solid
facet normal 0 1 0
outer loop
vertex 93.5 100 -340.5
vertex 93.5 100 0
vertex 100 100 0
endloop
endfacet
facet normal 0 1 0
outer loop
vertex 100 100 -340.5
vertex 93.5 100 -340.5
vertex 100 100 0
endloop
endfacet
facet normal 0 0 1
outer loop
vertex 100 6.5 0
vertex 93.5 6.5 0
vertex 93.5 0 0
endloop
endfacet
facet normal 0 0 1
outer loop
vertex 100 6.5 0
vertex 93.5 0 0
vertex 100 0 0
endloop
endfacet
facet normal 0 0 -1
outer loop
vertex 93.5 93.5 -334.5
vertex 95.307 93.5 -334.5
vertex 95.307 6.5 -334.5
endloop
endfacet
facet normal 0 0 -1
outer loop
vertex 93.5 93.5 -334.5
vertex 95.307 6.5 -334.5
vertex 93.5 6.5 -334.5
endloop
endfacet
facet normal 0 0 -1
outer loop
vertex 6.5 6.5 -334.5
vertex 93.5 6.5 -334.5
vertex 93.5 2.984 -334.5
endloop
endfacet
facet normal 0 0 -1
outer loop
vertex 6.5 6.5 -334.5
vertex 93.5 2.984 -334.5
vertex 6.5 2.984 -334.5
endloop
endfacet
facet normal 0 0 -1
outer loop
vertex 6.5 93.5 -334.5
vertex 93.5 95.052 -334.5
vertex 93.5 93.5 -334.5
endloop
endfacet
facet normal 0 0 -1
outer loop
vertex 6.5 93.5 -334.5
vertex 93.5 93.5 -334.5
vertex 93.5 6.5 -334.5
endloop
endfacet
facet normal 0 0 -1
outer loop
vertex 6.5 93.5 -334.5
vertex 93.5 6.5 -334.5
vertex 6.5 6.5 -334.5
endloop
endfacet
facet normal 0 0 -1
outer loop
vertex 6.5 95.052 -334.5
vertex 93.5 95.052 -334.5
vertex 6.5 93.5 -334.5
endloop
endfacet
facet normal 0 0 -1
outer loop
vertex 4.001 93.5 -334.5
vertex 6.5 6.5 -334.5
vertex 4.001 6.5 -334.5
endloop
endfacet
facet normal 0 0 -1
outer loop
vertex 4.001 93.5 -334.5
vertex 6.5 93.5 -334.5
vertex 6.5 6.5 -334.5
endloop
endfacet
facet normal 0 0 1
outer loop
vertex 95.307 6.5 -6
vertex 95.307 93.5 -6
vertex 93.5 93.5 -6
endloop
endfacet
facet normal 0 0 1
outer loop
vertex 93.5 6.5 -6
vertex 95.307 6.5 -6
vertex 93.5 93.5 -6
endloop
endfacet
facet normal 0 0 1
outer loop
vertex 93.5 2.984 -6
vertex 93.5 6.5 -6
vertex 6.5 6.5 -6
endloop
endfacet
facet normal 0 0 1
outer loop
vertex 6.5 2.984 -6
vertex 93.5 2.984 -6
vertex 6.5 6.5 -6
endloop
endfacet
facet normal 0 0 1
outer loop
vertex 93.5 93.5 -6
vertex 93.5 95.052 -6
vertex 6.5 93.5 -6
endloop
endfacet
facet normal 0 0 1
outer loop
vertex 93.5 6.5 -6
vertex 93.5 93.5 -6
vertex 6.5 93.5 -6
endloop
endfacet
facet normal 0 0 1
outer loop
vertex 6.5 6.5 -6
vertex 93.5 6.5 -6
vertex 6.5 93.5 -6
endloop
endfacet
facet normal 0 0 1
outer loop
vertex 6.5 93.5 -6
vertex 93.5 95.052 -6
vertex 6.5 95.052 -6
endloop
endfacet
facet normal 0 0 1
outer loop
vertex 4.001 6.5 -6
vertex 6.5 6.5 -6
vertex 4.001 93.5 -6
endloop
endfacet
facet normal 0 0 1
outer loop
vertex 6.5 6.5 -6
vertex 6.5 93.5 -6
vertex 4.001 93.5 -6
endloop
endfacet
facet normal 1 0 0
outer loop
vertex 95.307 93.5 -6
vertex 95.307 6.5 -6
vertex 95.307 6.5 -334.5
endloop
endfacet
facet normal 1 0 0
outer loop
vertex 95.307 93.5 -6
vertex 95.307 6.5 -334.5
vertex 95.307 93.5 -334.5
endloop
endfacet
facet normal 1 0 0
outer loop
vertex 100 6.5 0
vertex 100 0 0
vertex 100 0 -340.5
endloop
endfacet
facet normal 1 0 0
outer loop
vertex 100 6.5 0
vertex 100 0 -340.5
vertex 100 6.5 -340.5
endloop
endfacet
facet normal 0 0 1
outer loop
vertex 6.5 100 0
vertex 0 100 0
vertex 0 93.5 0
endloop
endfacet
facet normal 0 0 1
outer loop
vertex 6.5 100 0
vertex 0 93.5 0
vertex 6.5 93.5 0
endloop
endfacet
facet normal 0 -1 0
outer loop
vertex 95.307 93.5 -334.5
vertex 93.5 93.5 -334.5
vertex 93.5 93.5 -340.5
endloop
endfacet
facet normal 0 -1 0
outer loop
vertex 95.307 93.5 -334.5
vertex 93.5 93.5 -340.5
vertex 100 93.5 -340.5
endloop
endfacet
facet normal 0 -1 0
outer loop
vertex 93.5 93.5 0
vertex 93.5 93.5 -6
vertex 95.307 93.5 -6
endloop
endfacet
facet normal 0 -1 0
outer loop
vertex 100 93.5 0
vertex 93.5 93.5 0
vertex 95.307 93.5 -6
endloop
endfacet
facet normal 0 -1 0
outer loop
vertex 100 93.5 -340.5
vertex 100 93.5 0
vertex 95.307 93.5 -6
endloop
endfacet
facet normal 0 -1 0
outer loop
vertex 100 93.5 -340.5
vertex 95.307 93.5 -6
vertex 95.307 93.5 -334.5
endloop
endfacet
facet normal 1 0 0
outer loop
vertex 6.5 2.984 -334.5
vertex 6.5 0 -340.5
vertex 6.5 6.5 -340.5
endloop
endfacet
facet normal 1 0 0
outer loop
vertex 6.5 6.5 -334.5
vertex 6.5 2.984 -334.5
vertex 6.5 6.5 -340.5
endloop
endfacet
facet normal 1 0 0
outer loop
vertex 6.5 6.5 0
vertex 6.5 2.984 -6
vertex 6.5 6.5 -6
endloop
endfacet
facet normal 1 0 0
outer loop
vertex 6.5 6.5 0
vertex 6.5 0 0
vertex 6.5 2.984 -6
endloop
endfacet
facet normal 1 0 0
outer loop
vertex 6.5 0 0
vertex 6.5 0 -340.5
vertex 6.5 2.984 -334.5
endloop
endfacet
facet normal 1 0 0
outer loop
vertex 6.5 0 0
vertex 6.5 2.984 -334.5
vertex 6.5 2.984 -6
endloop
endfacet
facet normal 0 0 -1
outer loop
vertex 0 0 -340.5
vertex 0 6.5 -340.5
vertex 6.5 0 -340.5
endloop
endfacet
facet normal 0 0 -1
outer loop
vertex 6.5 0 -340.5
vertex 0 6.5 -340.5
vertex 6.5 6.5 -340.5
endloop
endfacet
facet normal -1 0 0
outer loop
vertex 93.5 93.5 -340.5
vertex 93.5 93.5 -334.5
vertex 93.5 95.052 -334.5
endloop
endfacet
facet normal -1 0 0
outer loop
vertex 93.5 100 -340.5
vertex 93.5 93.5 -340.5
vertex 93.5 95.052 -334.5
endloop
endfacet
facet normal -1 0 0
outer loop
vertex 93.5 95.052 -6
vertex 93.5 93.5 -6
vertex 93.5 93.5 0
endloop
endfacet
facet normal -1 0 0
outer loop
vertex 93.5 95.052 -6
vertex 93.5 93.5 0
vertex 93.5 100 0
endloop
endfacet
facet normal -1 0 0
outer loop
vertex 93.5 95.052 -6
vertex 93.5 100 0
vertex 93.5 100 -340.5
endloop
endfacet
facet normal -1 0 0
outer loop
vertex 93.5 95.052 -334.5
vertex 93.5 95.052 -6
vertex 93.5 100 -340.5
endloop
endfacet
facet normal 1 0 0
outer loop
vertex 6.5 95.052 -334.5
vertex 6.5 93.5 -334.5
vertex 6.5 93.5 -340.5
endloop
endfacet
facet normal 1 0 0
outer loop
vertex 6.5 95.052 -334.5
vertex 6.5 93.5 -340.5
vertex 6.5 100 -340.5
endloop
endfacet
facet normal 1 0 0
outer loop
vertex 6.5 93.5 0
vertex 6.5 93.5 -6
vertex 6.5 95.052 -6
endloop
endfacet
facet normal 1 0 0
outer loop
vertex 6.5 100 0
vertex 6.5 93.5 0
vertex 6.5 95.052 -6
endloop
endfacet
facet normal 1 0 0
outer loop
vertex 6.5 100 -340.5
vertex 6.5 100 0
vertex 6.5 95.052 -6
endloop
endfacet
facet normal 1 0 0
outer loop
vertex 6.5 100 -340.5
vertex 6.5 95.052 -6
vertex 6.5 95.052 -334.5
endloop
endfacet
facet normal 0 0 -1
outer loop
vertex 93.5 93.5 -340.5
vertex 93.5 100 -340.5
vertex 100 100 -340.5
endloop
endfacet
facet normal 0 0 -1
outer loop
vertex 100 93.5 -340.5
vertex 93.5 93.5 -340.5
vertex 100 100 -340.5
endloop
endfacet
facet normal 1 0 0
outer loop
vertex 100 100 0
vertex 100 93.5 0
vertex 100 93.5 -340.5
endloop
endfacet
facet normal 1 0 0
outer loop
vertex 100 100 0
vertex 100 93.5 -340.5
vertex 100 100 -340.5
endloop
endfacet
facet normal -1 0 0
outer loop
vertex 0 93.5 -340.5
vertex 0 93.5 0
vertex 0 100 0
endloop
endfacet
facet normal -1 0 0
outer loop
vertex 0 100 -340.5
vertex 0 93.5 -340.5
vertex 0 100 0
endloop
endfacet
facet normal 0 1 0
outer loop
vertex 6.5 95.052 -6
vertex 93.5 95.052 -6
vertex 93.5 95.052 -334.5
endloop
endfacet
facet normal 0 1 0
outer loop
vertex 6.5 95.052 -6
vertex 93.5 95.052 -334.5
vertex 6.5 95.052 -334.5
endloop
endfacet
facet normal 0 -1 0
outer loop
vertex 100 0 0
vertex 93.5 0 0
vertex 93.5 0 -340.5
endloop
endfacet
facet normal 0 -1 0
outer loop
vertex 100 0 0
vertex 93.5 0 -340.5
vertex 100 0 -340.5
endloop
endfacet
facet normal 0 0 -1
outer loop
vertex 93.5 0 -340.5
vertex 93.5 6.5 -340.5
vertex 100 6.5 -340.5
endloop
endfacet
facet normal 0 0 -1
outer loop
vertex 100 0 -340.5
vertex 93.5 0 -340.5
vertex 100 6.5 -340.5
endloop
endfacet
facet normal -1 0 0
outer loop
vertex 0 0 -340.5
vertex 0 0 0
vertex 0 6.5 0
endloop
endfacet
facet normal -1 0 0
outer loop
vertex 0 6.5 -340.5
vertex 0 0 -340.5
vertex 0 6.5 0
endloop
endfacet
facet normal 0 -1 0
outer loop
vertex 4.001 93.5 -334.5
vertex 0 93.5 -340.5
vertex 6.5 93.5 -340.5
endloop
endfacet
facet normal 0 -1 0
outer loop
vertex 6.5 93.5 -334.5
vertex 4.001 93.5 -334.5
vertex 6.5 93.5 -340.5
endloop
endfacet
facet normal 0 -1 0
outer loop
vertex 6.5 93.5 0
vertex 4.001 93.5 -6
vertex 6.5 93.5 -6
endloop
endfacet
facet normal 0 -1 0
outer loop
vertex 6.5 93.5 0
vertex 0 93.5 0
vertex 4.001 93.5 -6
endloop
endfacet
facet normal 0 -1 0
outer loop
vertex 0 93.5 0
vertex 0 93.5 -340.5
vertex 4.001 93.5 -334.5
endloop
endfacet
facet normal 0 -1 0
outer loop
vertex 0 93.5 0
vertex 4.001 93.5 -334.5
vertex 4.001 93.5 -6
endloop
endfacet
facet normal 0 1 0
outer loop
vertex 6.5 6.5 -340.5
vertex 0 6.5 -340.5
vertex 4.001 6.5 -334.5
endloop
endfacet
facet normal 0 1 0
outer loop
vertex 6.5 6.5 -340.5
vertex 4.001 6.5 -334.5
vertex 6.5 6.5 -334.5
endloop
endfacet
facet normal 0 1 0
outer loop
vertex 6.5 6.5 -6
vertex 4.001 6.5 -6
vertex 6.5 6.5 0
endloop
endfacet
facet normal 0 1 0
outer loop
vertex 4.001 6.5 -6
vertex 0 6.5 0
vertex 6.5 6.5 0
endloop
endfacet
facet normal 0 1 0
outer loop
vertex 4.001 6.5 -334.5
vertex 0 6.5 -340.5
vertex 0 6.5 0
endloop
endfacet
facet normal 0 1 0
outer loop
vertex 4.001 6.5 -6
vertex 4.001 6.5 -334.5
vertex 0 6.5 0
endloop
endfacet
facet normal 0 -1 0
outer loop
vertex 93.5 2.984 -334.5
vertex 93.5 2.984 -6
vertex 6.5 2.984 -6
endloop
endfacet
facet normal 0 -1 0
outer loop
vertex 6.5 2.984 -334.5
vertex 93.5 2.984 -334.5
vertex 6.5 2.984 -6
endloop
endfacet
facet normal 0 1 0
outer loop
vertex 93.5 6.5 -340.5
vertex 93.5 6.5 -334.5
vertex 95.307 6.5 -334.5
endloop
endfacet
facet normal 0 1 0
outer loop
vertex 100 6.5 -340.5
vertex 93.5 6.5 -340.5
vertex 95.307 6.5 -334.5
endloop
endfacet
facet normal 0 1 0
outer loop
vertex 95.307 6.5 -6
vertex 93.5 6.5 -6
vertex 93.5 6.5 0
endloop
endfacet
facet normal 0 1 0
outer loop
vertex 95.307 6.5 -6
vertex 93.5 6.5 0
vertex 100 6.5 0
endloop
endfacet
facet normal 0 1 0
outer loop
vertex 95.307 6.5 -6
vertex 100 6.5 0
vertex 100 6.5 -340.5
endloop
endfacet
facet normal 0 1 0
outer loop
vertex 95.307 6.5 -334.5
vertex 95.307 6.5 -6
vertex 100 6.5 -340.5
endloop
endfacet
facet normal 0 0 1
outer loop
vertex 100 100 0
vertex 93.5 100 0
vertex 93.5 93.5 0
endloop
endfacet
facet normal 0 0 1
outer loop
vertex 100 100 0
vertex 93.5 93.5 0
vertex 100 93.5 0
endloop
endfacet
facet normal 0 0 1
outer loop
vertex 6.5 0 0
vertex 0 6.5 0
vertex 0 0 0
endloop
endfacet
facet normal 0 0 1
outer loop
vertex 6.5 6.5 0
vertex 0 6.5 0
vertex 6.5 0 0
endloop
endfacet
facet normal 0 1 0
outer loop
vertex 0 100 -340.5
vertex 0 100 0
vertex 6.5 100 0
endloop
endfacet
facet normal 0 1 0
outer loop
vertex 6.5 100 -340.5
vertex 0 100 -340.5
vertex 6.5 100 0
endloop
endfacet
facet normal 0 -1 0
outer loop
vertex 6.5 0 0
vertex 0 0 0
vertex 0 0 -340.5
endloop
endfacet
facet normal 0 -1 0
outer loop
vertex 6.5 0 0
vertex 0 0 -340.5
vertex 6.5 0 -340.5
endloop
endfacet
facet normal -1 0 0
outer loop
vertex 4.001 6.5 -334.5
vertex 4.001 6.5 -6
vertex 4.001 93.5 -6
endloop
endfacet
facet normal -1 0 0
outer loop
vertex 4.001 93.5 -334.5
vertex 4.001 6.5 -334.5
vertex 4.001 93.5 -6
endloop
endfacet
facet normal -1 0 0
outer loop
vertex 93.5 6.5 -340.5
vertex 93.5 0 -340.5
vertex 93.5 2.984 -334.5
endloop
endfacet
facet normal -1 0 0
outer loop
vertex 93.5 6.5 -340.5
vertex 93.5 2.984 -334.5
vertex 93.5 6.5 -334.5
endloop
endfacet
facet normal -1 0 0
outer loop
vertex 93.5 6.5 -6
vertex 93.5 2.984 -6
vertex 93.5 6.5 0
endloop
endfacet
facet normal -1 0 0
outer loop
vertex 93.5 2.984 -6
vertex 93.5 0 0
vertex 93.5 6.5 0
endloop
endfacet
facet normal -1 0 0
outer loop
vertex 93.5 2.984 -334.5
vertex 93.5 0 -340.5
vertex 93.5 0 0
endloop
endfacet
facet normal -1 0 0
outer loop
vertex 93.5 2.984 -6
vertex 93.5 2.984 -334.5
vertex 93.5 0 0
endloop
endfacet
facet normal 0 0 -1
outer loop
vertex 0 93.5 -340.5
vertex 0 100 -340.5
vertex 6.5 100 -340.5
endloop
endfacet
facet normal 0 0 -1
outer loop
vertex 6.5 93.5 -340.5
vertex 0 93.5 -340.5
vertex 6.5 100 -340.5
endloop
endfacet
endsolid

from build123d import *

# Parameters (mm, degrees)
SKETCH1_W             = 6.5
SKETCH1_H             = 6.5
BOSS_EXTRUDE1_DEPTH   = 340.5
BOSS_EXTRUDE1_2_DEPTH = 340.5
BOSS_EXTRUDE1_3_DEPTH = 340.5
BOSS_EXTRUDE1_4_DEPTH = 340.5
SKETCH2_W             = 91.305836421
SKETCH2_H             = 92.06883784
BOSS_EXTRUDE2_DEPTH   = 328.5


with BuildPart() as part:
    # Sketch1 → Boss-Extrude1 (new body)
    with BuildSketch(Plane.XY):
        with Locations((3.25, 96.75)):
            Rectangle(SKETCH1_W, SKETCH1_H)
    extrude(amount=-BOSS_EXTRUDE1_DEPTH)



with BuildPart() as body_2:
    # Sketch1 → Boss-Extrude1 2 (new body)
    with BuildSketch(Plane.XY):
        with Locations((96.75, 96.75)):
            Rectangle(SKETCH1_W, SKETCH1_H)
    extrude(amount=-BOSS_EXTRUDE1_2_DEPTH)


with BuildPart() as body_3:
    # Sketch1 → Boss-Extrude1 3 (new body)
    with BuildSketch(Plane.XY):
        with Locations((96.75, 3.25)):
            Rectangle(SKETCH1_W, SKETCH1_H)
    extrude(amount=-BOSS_EXTRUDE1_3_DEPTH)


with BuildPart() as body_4:
    # Sketch1 → Boss-Extrude1 4 (new body)
    with BuildSketch(Plane.XY):
        with Locations((3.25, 3.25)):
            Rectangle(SKETCH1_W, SKETCH1_H)
    extrude(amount=-BOSS_EXTRUDE1_4_DEPTH)


with BuildPart() as part_1:
    add(part.part)

    add(body_2.part)  # Boss-Extrude2 merges body 2

    add(body_3.part)  # Boss-Extrude2 merges body 3

    add(body_4.part)  # Boss-Extrude2 merges body 4
    # Sketch2 → Boss-Extrude2 (add)
    with BuildSketch(Plane(origin=(0, 0, -6), x_dir=(-1, 0, 0), z_dir=(0, 0, -1))):
        with Locations((-49.653832388, 49.017997872)):
            Rectangle(SKETCH2_W, SKETCH2_H)
    extrude(amount=BOSS_EXTRUDE2_DEPTH)


solid = part_1.part
